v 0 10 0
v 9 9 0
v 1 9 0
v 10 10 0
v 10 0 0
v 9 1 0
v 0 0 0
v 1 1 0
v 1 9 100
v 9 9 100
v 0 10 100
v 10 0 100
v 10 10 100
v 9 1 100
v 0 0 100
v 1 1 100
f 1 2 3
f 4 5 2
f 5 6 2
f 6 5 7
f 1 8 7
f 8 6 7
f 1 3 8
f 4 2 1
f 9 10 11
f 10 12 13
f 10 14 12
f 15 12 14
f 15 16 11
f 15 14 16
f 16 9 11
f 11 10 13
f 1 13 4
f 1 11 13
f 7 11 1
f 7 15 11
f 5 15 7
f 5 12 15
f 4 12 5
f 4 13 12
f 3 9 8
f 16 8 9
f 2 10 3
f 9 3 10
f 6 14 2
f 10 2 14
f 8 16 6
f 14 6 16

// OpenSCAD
module square_section(h, t, l, miter) {
	box_section(h, h, t, l, miter);
}

module box_section(h, w, t, l, miter) {
	//echo(str(l, "mm box ", h, "x", w, "x", t, "mm"));
	translate([h/2, w/2, 0]) render() difference() {
		linear_extrude(l) translate([-w/2, -h/2]) difference() {
			polygon([[0, 0], [0, h], [w, h], [w, 0]]);
			polygon([[t, t], [t, h-t], [w-t, h-t], [w-t, t]]);
		}
		if (miter) {
			translate([h/2, 0, 0]) rotate([0, 45, 0]) translate([-h*2, -w, -h]) cube([h*3, w*2, h]);
			translate([h/2, 0, l]) rotate([0, -45, 0]) translate([-h*2, -w, 0]) cube([h*3, w*2, h]);
		}
	}
}

module angle_section(h, w, t, l) {
	//echo(str(l, "mm angle ", h, "x", w, "x", t, "mm"));
	linear_extrude(l) translate([-w/2, -h/2]) {
		polygon([[0, 0], [h, 0], [h, t], [t, t], [t, w], [0, w]]);
	}
}

square_section(10, 1, 100);
